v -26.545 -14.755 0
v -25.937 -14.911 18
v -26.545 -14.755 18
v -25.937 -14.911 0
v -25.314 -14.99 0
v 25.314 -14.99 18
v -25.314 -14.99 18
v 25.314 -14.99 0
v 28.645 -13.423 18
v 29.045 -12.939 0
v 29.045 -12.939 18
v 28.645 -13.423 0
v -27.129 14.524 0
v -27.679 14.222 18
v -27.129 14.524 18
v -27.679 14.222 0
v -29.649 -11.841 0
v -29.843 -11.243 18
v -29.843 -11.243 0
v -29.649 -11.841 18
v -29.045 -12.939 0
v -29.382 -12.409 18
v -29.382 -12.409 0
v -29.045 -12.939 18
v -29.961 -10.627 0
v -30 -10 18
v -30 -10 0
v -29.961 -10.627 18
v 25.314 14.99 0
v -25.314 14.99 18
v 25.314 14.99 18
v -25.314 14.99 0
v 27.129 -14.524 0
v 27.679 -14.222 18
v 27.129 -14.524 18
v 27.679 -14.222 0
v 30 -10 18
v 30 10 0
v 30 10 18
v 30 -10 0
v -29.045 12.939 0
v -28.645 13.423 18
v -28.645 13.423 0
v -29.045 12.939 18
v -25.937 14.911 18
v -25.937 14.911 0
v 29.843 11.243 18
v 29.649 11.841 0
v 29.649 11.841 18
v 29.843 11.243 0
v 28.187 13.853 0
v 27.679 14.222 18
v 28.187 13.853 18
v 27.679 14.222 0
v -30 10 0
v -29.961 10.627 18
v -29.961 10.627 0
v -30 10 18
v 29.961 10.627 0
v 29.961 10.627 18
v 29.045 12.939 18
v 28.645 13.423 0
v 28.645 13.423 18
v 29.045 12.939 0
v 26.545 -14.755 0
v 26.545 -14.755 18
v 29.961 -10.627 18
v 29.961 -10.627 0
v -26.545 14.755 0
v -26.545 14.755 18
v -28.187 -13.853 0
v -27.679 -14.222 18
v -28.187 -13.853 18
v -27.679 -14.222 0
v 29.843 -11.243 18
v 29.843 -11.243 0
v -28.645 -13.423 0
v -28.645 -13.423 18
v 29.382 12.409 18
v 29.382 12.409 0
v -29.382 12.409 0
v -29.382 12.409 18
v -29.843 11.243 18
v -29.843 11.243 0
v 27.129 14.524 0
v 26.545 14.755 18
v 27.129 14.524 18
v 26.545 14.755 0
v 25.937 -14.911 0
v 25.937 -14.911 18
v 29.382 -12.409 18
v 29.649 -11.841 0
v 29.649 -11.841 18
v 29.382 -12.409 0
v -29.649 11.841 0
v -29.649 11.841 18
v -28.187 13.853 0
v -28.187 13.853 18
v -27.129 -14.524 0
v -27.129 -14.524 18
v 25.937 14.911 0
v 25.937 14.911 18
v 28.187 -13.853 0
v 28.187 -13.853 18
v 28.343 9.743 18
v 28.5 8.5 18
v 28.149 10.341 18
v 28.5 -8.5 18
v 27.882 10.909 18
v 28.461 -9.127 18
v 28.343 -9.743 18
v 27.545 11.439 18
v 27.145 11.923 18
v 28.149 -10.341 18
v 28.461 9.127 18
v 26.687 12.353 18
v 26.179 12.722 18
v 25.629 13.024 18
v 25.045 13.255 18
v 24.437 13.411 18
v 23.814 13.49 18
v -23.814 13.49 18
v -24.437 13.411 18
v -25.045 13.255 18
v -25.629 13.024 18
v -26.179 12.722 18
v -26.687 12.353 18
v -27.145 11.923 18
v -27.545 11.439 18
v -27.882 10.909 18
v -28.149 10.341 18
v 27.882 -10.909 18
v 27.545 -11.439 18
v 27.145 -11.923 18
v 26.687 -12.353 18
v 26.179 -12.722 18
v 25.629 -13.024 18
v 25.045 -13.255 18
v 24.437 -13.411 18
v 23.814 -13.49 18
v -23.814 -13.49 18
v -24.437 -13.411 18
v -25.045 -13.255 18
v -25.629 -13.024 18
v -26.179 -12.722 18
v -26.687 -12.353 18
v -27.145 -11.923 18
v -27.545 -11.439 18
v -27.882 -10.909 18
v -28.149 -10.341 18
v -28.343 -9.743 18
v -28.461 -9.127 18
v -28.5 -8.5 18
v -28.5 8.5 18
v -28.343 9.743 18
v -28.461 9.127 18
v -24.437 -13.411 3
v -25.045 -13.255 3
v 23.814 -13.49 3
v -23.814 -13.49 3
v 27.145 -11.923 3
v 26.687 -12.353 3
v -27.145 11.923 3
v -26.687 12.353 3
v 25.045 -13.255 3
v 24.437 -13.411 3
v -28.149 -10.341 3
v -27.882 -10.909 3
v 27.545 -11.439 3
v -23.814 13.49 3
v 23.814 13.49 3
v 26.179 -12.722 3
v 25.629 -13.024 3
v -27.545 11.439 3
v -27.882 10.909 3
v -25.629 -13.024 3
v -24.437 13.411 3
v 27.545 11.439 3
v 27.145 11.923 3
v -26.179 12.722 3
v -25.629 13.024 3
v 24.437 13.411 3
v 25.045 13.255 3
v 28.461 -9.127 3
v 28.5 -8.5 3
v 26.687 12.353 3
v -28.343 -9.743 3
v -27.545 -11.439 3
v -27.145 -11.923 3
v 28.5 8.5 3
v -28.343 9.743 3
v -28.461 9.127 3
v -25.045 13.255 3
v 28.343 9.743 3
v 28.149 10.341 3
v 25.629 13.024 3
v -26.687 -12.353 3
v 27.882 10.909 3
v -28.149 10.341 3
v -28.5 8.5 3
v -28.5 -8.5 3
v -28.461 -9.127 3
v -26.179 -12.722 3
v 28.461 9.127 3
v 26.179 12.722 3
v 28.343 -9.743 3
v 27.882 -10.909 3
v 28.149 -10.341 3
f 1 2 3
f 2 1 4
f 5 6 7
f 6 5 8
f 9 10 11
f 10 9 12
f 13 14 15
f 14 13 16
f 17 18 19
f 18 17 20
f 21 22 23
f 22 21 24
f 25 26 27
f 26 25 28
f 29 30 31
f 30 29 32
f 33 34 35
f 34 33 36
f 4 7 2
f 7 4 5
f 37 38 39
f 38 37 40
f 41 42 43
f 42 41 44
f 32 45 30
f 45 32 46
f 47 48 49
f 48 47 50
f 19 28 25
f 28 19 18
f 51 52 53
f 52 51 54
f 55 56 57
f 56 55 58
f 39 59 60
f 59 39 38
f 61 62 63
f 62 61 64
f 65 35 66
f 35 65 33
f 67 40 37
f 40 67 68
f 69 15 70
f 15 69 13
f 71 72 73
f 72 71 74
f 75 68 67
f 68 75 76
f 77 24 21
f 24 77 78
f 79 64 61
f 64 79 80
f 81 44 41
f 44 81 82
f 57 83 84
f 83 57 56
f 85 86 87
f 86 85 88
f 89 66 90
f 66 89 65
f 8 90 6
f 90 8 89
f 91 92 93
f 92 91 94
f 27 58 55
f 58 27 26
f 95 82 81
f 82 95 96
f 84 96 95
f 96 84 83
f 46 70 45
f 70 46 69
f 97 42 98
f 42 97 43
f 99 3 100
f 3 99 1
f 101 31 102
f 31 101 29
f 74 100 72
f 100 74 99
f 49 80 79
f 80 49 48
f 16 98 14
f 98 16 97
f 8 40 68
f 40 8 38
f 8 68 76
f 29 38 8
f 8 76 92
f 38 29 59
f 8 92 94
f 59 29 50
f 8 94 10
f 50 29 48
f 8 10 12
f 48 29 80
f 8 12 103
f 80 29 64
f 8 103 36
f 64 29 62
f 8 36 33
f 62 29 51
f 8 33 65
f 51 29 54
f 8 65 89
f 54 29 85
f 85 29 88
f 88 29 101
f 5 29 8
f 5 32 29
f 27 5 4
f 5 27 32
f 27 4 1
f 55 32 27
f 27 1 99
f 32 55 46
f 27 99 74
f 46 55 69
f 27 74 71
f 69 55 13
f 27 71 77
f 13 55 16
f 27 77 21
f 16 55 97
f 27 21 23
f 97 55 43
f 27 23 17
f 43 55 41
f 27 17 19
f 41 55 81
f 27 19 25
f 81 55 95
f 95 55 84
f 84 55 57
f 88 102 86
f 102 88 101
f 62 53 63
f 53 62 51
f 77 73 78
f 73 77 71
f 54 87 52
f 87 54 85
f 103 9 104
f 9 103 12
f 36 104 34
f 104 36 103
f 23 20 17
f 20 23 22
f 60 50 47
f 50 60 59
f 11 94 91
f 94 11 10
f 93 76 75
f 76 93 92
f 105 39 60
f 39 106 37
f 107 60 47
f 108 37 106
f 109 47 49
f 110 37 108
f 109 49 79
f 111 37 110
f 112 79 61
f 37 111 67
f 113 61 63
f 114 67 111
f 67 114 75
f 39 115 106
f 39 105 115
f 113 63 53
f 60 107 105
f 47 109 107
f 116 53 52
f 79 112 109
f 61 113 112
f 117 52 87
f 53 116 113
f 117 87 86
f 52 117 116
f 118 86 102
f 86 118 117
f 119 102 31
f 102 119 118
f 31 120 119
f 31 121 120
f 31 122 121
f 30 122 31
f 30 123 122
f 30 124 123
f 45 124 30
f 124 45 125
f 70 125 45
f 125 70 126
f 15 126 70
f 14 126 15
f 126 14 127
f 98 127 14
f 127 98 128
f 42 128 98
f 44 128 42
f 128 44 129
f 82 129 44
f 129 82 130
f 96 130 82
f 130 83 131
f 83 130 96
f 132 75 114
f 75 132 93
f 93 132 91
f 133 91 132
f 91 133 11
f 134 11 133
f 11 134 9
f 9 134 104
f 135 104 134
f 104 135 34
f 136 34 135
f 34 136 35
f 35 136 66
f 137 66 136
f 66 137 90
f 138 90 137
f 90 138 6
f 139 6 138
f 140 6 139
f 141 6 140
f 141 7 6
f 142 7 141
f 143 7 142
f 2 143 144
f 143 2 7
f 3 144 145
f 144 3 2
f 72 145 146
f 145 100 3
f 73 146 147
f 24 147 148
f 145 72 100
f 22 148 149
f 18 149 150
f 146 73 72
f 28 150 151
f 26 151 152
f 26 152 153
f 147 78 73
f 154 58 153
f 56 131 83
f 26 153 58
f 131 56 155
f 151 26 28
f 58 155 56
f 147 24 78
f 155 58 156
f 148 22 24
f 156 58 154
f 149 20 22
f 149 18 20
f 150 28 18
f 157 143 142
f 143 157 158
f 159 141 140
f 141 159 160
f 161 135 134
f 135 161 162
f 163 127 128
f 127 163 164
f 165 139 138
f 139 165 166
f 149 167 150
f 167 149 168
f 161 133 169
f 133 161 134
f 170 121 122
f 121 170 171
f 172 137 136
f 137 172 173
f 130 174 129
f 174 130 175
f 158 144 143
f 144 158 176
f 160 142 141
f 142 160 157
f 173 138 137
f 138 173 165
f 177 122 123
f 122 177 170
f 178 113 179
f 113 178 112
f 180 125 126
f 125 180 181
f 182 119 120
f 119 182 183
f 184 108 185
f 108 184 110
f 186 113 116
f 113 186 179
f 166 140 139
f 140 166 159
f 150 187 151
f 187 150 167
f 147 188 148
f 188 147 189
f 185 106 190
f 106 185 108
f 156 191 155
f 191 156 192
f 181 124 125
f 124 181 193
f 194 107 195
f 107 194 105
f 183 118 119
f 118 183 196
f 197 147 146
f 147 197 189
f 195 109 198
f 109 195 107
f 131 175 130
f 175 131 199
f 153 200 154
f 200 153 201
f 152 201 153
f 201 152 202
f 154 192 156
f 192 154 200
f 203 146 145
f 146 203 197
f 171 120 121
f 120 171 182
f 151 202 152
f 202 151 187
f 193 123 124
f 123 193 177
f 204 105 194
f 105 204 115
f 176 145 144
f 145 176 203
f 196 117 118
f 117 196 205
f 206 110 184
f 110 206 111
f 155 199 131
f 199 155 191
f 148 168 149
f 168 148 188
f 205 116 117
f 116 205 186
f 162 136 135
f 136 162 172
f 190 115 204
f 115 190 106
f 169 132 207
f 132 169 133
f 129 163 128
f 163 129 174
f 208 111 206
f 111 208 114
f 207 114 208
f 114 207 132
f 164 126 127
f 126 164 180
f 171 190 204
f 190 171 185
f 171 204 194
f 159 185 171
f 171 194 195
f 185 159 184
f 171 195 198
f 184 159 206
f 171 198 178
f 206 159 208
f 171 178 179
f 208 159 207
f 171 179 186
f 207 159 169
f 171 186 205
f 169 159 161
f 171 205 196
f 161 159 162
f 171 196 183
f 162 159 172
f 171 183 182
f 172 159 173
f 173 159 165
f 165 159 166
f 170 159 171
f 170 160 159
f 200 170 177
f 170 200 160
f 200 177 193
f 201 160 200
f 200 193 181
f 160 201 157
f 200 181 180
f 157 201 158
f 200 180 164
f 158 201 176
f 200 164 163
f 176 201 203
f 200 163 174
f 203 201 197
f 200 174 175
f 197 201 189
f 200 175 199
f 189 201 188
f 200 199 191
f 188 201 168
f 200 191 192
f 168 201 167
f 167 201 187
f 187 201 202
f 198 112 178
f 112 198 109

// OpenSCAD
$fn = 50;


difference() {
	union() {
		hull() {
			translate(v = [-25.0000000000, 10.0000000000, 0]) {
				cylinder(h = 18, r = 5);
			}
			translate(v = [25.0000000000, 10.0000000000, 0]) {
				cylinder(h = 18, r = 5);
			}
			translate(v = [-25.0000000000, -10.0000000000, 0]) {
				cylinder(h = 18, r = 5);
			}
			translate(v = [25.0000000000, -10.0000000000, 0]) {
				cylinder(h = 18, r = 5);
			}
		}
	}
	union() {
		translate(v = [0, 0, 3]) {
			#hull() {
				translate(v = [-23.5000000000, 8.5000000000, 0]) {
					cylinder(h = 15, r = 5);
				}
				translate(v = [23.5000000000, 8.5000000000, 0]) {
					cylinder(h = 15, r = 5);
				}
				translate(v = [-23.5000000000, -8.5000000000, 0]) {
					cylinder(h = 15, r = 5);
				}
				translate(v = [23.5000000000, -8.5000000000, 0]) {
					cylinder(h = 15, r = 5);
				}
			}
		}
	}
}
